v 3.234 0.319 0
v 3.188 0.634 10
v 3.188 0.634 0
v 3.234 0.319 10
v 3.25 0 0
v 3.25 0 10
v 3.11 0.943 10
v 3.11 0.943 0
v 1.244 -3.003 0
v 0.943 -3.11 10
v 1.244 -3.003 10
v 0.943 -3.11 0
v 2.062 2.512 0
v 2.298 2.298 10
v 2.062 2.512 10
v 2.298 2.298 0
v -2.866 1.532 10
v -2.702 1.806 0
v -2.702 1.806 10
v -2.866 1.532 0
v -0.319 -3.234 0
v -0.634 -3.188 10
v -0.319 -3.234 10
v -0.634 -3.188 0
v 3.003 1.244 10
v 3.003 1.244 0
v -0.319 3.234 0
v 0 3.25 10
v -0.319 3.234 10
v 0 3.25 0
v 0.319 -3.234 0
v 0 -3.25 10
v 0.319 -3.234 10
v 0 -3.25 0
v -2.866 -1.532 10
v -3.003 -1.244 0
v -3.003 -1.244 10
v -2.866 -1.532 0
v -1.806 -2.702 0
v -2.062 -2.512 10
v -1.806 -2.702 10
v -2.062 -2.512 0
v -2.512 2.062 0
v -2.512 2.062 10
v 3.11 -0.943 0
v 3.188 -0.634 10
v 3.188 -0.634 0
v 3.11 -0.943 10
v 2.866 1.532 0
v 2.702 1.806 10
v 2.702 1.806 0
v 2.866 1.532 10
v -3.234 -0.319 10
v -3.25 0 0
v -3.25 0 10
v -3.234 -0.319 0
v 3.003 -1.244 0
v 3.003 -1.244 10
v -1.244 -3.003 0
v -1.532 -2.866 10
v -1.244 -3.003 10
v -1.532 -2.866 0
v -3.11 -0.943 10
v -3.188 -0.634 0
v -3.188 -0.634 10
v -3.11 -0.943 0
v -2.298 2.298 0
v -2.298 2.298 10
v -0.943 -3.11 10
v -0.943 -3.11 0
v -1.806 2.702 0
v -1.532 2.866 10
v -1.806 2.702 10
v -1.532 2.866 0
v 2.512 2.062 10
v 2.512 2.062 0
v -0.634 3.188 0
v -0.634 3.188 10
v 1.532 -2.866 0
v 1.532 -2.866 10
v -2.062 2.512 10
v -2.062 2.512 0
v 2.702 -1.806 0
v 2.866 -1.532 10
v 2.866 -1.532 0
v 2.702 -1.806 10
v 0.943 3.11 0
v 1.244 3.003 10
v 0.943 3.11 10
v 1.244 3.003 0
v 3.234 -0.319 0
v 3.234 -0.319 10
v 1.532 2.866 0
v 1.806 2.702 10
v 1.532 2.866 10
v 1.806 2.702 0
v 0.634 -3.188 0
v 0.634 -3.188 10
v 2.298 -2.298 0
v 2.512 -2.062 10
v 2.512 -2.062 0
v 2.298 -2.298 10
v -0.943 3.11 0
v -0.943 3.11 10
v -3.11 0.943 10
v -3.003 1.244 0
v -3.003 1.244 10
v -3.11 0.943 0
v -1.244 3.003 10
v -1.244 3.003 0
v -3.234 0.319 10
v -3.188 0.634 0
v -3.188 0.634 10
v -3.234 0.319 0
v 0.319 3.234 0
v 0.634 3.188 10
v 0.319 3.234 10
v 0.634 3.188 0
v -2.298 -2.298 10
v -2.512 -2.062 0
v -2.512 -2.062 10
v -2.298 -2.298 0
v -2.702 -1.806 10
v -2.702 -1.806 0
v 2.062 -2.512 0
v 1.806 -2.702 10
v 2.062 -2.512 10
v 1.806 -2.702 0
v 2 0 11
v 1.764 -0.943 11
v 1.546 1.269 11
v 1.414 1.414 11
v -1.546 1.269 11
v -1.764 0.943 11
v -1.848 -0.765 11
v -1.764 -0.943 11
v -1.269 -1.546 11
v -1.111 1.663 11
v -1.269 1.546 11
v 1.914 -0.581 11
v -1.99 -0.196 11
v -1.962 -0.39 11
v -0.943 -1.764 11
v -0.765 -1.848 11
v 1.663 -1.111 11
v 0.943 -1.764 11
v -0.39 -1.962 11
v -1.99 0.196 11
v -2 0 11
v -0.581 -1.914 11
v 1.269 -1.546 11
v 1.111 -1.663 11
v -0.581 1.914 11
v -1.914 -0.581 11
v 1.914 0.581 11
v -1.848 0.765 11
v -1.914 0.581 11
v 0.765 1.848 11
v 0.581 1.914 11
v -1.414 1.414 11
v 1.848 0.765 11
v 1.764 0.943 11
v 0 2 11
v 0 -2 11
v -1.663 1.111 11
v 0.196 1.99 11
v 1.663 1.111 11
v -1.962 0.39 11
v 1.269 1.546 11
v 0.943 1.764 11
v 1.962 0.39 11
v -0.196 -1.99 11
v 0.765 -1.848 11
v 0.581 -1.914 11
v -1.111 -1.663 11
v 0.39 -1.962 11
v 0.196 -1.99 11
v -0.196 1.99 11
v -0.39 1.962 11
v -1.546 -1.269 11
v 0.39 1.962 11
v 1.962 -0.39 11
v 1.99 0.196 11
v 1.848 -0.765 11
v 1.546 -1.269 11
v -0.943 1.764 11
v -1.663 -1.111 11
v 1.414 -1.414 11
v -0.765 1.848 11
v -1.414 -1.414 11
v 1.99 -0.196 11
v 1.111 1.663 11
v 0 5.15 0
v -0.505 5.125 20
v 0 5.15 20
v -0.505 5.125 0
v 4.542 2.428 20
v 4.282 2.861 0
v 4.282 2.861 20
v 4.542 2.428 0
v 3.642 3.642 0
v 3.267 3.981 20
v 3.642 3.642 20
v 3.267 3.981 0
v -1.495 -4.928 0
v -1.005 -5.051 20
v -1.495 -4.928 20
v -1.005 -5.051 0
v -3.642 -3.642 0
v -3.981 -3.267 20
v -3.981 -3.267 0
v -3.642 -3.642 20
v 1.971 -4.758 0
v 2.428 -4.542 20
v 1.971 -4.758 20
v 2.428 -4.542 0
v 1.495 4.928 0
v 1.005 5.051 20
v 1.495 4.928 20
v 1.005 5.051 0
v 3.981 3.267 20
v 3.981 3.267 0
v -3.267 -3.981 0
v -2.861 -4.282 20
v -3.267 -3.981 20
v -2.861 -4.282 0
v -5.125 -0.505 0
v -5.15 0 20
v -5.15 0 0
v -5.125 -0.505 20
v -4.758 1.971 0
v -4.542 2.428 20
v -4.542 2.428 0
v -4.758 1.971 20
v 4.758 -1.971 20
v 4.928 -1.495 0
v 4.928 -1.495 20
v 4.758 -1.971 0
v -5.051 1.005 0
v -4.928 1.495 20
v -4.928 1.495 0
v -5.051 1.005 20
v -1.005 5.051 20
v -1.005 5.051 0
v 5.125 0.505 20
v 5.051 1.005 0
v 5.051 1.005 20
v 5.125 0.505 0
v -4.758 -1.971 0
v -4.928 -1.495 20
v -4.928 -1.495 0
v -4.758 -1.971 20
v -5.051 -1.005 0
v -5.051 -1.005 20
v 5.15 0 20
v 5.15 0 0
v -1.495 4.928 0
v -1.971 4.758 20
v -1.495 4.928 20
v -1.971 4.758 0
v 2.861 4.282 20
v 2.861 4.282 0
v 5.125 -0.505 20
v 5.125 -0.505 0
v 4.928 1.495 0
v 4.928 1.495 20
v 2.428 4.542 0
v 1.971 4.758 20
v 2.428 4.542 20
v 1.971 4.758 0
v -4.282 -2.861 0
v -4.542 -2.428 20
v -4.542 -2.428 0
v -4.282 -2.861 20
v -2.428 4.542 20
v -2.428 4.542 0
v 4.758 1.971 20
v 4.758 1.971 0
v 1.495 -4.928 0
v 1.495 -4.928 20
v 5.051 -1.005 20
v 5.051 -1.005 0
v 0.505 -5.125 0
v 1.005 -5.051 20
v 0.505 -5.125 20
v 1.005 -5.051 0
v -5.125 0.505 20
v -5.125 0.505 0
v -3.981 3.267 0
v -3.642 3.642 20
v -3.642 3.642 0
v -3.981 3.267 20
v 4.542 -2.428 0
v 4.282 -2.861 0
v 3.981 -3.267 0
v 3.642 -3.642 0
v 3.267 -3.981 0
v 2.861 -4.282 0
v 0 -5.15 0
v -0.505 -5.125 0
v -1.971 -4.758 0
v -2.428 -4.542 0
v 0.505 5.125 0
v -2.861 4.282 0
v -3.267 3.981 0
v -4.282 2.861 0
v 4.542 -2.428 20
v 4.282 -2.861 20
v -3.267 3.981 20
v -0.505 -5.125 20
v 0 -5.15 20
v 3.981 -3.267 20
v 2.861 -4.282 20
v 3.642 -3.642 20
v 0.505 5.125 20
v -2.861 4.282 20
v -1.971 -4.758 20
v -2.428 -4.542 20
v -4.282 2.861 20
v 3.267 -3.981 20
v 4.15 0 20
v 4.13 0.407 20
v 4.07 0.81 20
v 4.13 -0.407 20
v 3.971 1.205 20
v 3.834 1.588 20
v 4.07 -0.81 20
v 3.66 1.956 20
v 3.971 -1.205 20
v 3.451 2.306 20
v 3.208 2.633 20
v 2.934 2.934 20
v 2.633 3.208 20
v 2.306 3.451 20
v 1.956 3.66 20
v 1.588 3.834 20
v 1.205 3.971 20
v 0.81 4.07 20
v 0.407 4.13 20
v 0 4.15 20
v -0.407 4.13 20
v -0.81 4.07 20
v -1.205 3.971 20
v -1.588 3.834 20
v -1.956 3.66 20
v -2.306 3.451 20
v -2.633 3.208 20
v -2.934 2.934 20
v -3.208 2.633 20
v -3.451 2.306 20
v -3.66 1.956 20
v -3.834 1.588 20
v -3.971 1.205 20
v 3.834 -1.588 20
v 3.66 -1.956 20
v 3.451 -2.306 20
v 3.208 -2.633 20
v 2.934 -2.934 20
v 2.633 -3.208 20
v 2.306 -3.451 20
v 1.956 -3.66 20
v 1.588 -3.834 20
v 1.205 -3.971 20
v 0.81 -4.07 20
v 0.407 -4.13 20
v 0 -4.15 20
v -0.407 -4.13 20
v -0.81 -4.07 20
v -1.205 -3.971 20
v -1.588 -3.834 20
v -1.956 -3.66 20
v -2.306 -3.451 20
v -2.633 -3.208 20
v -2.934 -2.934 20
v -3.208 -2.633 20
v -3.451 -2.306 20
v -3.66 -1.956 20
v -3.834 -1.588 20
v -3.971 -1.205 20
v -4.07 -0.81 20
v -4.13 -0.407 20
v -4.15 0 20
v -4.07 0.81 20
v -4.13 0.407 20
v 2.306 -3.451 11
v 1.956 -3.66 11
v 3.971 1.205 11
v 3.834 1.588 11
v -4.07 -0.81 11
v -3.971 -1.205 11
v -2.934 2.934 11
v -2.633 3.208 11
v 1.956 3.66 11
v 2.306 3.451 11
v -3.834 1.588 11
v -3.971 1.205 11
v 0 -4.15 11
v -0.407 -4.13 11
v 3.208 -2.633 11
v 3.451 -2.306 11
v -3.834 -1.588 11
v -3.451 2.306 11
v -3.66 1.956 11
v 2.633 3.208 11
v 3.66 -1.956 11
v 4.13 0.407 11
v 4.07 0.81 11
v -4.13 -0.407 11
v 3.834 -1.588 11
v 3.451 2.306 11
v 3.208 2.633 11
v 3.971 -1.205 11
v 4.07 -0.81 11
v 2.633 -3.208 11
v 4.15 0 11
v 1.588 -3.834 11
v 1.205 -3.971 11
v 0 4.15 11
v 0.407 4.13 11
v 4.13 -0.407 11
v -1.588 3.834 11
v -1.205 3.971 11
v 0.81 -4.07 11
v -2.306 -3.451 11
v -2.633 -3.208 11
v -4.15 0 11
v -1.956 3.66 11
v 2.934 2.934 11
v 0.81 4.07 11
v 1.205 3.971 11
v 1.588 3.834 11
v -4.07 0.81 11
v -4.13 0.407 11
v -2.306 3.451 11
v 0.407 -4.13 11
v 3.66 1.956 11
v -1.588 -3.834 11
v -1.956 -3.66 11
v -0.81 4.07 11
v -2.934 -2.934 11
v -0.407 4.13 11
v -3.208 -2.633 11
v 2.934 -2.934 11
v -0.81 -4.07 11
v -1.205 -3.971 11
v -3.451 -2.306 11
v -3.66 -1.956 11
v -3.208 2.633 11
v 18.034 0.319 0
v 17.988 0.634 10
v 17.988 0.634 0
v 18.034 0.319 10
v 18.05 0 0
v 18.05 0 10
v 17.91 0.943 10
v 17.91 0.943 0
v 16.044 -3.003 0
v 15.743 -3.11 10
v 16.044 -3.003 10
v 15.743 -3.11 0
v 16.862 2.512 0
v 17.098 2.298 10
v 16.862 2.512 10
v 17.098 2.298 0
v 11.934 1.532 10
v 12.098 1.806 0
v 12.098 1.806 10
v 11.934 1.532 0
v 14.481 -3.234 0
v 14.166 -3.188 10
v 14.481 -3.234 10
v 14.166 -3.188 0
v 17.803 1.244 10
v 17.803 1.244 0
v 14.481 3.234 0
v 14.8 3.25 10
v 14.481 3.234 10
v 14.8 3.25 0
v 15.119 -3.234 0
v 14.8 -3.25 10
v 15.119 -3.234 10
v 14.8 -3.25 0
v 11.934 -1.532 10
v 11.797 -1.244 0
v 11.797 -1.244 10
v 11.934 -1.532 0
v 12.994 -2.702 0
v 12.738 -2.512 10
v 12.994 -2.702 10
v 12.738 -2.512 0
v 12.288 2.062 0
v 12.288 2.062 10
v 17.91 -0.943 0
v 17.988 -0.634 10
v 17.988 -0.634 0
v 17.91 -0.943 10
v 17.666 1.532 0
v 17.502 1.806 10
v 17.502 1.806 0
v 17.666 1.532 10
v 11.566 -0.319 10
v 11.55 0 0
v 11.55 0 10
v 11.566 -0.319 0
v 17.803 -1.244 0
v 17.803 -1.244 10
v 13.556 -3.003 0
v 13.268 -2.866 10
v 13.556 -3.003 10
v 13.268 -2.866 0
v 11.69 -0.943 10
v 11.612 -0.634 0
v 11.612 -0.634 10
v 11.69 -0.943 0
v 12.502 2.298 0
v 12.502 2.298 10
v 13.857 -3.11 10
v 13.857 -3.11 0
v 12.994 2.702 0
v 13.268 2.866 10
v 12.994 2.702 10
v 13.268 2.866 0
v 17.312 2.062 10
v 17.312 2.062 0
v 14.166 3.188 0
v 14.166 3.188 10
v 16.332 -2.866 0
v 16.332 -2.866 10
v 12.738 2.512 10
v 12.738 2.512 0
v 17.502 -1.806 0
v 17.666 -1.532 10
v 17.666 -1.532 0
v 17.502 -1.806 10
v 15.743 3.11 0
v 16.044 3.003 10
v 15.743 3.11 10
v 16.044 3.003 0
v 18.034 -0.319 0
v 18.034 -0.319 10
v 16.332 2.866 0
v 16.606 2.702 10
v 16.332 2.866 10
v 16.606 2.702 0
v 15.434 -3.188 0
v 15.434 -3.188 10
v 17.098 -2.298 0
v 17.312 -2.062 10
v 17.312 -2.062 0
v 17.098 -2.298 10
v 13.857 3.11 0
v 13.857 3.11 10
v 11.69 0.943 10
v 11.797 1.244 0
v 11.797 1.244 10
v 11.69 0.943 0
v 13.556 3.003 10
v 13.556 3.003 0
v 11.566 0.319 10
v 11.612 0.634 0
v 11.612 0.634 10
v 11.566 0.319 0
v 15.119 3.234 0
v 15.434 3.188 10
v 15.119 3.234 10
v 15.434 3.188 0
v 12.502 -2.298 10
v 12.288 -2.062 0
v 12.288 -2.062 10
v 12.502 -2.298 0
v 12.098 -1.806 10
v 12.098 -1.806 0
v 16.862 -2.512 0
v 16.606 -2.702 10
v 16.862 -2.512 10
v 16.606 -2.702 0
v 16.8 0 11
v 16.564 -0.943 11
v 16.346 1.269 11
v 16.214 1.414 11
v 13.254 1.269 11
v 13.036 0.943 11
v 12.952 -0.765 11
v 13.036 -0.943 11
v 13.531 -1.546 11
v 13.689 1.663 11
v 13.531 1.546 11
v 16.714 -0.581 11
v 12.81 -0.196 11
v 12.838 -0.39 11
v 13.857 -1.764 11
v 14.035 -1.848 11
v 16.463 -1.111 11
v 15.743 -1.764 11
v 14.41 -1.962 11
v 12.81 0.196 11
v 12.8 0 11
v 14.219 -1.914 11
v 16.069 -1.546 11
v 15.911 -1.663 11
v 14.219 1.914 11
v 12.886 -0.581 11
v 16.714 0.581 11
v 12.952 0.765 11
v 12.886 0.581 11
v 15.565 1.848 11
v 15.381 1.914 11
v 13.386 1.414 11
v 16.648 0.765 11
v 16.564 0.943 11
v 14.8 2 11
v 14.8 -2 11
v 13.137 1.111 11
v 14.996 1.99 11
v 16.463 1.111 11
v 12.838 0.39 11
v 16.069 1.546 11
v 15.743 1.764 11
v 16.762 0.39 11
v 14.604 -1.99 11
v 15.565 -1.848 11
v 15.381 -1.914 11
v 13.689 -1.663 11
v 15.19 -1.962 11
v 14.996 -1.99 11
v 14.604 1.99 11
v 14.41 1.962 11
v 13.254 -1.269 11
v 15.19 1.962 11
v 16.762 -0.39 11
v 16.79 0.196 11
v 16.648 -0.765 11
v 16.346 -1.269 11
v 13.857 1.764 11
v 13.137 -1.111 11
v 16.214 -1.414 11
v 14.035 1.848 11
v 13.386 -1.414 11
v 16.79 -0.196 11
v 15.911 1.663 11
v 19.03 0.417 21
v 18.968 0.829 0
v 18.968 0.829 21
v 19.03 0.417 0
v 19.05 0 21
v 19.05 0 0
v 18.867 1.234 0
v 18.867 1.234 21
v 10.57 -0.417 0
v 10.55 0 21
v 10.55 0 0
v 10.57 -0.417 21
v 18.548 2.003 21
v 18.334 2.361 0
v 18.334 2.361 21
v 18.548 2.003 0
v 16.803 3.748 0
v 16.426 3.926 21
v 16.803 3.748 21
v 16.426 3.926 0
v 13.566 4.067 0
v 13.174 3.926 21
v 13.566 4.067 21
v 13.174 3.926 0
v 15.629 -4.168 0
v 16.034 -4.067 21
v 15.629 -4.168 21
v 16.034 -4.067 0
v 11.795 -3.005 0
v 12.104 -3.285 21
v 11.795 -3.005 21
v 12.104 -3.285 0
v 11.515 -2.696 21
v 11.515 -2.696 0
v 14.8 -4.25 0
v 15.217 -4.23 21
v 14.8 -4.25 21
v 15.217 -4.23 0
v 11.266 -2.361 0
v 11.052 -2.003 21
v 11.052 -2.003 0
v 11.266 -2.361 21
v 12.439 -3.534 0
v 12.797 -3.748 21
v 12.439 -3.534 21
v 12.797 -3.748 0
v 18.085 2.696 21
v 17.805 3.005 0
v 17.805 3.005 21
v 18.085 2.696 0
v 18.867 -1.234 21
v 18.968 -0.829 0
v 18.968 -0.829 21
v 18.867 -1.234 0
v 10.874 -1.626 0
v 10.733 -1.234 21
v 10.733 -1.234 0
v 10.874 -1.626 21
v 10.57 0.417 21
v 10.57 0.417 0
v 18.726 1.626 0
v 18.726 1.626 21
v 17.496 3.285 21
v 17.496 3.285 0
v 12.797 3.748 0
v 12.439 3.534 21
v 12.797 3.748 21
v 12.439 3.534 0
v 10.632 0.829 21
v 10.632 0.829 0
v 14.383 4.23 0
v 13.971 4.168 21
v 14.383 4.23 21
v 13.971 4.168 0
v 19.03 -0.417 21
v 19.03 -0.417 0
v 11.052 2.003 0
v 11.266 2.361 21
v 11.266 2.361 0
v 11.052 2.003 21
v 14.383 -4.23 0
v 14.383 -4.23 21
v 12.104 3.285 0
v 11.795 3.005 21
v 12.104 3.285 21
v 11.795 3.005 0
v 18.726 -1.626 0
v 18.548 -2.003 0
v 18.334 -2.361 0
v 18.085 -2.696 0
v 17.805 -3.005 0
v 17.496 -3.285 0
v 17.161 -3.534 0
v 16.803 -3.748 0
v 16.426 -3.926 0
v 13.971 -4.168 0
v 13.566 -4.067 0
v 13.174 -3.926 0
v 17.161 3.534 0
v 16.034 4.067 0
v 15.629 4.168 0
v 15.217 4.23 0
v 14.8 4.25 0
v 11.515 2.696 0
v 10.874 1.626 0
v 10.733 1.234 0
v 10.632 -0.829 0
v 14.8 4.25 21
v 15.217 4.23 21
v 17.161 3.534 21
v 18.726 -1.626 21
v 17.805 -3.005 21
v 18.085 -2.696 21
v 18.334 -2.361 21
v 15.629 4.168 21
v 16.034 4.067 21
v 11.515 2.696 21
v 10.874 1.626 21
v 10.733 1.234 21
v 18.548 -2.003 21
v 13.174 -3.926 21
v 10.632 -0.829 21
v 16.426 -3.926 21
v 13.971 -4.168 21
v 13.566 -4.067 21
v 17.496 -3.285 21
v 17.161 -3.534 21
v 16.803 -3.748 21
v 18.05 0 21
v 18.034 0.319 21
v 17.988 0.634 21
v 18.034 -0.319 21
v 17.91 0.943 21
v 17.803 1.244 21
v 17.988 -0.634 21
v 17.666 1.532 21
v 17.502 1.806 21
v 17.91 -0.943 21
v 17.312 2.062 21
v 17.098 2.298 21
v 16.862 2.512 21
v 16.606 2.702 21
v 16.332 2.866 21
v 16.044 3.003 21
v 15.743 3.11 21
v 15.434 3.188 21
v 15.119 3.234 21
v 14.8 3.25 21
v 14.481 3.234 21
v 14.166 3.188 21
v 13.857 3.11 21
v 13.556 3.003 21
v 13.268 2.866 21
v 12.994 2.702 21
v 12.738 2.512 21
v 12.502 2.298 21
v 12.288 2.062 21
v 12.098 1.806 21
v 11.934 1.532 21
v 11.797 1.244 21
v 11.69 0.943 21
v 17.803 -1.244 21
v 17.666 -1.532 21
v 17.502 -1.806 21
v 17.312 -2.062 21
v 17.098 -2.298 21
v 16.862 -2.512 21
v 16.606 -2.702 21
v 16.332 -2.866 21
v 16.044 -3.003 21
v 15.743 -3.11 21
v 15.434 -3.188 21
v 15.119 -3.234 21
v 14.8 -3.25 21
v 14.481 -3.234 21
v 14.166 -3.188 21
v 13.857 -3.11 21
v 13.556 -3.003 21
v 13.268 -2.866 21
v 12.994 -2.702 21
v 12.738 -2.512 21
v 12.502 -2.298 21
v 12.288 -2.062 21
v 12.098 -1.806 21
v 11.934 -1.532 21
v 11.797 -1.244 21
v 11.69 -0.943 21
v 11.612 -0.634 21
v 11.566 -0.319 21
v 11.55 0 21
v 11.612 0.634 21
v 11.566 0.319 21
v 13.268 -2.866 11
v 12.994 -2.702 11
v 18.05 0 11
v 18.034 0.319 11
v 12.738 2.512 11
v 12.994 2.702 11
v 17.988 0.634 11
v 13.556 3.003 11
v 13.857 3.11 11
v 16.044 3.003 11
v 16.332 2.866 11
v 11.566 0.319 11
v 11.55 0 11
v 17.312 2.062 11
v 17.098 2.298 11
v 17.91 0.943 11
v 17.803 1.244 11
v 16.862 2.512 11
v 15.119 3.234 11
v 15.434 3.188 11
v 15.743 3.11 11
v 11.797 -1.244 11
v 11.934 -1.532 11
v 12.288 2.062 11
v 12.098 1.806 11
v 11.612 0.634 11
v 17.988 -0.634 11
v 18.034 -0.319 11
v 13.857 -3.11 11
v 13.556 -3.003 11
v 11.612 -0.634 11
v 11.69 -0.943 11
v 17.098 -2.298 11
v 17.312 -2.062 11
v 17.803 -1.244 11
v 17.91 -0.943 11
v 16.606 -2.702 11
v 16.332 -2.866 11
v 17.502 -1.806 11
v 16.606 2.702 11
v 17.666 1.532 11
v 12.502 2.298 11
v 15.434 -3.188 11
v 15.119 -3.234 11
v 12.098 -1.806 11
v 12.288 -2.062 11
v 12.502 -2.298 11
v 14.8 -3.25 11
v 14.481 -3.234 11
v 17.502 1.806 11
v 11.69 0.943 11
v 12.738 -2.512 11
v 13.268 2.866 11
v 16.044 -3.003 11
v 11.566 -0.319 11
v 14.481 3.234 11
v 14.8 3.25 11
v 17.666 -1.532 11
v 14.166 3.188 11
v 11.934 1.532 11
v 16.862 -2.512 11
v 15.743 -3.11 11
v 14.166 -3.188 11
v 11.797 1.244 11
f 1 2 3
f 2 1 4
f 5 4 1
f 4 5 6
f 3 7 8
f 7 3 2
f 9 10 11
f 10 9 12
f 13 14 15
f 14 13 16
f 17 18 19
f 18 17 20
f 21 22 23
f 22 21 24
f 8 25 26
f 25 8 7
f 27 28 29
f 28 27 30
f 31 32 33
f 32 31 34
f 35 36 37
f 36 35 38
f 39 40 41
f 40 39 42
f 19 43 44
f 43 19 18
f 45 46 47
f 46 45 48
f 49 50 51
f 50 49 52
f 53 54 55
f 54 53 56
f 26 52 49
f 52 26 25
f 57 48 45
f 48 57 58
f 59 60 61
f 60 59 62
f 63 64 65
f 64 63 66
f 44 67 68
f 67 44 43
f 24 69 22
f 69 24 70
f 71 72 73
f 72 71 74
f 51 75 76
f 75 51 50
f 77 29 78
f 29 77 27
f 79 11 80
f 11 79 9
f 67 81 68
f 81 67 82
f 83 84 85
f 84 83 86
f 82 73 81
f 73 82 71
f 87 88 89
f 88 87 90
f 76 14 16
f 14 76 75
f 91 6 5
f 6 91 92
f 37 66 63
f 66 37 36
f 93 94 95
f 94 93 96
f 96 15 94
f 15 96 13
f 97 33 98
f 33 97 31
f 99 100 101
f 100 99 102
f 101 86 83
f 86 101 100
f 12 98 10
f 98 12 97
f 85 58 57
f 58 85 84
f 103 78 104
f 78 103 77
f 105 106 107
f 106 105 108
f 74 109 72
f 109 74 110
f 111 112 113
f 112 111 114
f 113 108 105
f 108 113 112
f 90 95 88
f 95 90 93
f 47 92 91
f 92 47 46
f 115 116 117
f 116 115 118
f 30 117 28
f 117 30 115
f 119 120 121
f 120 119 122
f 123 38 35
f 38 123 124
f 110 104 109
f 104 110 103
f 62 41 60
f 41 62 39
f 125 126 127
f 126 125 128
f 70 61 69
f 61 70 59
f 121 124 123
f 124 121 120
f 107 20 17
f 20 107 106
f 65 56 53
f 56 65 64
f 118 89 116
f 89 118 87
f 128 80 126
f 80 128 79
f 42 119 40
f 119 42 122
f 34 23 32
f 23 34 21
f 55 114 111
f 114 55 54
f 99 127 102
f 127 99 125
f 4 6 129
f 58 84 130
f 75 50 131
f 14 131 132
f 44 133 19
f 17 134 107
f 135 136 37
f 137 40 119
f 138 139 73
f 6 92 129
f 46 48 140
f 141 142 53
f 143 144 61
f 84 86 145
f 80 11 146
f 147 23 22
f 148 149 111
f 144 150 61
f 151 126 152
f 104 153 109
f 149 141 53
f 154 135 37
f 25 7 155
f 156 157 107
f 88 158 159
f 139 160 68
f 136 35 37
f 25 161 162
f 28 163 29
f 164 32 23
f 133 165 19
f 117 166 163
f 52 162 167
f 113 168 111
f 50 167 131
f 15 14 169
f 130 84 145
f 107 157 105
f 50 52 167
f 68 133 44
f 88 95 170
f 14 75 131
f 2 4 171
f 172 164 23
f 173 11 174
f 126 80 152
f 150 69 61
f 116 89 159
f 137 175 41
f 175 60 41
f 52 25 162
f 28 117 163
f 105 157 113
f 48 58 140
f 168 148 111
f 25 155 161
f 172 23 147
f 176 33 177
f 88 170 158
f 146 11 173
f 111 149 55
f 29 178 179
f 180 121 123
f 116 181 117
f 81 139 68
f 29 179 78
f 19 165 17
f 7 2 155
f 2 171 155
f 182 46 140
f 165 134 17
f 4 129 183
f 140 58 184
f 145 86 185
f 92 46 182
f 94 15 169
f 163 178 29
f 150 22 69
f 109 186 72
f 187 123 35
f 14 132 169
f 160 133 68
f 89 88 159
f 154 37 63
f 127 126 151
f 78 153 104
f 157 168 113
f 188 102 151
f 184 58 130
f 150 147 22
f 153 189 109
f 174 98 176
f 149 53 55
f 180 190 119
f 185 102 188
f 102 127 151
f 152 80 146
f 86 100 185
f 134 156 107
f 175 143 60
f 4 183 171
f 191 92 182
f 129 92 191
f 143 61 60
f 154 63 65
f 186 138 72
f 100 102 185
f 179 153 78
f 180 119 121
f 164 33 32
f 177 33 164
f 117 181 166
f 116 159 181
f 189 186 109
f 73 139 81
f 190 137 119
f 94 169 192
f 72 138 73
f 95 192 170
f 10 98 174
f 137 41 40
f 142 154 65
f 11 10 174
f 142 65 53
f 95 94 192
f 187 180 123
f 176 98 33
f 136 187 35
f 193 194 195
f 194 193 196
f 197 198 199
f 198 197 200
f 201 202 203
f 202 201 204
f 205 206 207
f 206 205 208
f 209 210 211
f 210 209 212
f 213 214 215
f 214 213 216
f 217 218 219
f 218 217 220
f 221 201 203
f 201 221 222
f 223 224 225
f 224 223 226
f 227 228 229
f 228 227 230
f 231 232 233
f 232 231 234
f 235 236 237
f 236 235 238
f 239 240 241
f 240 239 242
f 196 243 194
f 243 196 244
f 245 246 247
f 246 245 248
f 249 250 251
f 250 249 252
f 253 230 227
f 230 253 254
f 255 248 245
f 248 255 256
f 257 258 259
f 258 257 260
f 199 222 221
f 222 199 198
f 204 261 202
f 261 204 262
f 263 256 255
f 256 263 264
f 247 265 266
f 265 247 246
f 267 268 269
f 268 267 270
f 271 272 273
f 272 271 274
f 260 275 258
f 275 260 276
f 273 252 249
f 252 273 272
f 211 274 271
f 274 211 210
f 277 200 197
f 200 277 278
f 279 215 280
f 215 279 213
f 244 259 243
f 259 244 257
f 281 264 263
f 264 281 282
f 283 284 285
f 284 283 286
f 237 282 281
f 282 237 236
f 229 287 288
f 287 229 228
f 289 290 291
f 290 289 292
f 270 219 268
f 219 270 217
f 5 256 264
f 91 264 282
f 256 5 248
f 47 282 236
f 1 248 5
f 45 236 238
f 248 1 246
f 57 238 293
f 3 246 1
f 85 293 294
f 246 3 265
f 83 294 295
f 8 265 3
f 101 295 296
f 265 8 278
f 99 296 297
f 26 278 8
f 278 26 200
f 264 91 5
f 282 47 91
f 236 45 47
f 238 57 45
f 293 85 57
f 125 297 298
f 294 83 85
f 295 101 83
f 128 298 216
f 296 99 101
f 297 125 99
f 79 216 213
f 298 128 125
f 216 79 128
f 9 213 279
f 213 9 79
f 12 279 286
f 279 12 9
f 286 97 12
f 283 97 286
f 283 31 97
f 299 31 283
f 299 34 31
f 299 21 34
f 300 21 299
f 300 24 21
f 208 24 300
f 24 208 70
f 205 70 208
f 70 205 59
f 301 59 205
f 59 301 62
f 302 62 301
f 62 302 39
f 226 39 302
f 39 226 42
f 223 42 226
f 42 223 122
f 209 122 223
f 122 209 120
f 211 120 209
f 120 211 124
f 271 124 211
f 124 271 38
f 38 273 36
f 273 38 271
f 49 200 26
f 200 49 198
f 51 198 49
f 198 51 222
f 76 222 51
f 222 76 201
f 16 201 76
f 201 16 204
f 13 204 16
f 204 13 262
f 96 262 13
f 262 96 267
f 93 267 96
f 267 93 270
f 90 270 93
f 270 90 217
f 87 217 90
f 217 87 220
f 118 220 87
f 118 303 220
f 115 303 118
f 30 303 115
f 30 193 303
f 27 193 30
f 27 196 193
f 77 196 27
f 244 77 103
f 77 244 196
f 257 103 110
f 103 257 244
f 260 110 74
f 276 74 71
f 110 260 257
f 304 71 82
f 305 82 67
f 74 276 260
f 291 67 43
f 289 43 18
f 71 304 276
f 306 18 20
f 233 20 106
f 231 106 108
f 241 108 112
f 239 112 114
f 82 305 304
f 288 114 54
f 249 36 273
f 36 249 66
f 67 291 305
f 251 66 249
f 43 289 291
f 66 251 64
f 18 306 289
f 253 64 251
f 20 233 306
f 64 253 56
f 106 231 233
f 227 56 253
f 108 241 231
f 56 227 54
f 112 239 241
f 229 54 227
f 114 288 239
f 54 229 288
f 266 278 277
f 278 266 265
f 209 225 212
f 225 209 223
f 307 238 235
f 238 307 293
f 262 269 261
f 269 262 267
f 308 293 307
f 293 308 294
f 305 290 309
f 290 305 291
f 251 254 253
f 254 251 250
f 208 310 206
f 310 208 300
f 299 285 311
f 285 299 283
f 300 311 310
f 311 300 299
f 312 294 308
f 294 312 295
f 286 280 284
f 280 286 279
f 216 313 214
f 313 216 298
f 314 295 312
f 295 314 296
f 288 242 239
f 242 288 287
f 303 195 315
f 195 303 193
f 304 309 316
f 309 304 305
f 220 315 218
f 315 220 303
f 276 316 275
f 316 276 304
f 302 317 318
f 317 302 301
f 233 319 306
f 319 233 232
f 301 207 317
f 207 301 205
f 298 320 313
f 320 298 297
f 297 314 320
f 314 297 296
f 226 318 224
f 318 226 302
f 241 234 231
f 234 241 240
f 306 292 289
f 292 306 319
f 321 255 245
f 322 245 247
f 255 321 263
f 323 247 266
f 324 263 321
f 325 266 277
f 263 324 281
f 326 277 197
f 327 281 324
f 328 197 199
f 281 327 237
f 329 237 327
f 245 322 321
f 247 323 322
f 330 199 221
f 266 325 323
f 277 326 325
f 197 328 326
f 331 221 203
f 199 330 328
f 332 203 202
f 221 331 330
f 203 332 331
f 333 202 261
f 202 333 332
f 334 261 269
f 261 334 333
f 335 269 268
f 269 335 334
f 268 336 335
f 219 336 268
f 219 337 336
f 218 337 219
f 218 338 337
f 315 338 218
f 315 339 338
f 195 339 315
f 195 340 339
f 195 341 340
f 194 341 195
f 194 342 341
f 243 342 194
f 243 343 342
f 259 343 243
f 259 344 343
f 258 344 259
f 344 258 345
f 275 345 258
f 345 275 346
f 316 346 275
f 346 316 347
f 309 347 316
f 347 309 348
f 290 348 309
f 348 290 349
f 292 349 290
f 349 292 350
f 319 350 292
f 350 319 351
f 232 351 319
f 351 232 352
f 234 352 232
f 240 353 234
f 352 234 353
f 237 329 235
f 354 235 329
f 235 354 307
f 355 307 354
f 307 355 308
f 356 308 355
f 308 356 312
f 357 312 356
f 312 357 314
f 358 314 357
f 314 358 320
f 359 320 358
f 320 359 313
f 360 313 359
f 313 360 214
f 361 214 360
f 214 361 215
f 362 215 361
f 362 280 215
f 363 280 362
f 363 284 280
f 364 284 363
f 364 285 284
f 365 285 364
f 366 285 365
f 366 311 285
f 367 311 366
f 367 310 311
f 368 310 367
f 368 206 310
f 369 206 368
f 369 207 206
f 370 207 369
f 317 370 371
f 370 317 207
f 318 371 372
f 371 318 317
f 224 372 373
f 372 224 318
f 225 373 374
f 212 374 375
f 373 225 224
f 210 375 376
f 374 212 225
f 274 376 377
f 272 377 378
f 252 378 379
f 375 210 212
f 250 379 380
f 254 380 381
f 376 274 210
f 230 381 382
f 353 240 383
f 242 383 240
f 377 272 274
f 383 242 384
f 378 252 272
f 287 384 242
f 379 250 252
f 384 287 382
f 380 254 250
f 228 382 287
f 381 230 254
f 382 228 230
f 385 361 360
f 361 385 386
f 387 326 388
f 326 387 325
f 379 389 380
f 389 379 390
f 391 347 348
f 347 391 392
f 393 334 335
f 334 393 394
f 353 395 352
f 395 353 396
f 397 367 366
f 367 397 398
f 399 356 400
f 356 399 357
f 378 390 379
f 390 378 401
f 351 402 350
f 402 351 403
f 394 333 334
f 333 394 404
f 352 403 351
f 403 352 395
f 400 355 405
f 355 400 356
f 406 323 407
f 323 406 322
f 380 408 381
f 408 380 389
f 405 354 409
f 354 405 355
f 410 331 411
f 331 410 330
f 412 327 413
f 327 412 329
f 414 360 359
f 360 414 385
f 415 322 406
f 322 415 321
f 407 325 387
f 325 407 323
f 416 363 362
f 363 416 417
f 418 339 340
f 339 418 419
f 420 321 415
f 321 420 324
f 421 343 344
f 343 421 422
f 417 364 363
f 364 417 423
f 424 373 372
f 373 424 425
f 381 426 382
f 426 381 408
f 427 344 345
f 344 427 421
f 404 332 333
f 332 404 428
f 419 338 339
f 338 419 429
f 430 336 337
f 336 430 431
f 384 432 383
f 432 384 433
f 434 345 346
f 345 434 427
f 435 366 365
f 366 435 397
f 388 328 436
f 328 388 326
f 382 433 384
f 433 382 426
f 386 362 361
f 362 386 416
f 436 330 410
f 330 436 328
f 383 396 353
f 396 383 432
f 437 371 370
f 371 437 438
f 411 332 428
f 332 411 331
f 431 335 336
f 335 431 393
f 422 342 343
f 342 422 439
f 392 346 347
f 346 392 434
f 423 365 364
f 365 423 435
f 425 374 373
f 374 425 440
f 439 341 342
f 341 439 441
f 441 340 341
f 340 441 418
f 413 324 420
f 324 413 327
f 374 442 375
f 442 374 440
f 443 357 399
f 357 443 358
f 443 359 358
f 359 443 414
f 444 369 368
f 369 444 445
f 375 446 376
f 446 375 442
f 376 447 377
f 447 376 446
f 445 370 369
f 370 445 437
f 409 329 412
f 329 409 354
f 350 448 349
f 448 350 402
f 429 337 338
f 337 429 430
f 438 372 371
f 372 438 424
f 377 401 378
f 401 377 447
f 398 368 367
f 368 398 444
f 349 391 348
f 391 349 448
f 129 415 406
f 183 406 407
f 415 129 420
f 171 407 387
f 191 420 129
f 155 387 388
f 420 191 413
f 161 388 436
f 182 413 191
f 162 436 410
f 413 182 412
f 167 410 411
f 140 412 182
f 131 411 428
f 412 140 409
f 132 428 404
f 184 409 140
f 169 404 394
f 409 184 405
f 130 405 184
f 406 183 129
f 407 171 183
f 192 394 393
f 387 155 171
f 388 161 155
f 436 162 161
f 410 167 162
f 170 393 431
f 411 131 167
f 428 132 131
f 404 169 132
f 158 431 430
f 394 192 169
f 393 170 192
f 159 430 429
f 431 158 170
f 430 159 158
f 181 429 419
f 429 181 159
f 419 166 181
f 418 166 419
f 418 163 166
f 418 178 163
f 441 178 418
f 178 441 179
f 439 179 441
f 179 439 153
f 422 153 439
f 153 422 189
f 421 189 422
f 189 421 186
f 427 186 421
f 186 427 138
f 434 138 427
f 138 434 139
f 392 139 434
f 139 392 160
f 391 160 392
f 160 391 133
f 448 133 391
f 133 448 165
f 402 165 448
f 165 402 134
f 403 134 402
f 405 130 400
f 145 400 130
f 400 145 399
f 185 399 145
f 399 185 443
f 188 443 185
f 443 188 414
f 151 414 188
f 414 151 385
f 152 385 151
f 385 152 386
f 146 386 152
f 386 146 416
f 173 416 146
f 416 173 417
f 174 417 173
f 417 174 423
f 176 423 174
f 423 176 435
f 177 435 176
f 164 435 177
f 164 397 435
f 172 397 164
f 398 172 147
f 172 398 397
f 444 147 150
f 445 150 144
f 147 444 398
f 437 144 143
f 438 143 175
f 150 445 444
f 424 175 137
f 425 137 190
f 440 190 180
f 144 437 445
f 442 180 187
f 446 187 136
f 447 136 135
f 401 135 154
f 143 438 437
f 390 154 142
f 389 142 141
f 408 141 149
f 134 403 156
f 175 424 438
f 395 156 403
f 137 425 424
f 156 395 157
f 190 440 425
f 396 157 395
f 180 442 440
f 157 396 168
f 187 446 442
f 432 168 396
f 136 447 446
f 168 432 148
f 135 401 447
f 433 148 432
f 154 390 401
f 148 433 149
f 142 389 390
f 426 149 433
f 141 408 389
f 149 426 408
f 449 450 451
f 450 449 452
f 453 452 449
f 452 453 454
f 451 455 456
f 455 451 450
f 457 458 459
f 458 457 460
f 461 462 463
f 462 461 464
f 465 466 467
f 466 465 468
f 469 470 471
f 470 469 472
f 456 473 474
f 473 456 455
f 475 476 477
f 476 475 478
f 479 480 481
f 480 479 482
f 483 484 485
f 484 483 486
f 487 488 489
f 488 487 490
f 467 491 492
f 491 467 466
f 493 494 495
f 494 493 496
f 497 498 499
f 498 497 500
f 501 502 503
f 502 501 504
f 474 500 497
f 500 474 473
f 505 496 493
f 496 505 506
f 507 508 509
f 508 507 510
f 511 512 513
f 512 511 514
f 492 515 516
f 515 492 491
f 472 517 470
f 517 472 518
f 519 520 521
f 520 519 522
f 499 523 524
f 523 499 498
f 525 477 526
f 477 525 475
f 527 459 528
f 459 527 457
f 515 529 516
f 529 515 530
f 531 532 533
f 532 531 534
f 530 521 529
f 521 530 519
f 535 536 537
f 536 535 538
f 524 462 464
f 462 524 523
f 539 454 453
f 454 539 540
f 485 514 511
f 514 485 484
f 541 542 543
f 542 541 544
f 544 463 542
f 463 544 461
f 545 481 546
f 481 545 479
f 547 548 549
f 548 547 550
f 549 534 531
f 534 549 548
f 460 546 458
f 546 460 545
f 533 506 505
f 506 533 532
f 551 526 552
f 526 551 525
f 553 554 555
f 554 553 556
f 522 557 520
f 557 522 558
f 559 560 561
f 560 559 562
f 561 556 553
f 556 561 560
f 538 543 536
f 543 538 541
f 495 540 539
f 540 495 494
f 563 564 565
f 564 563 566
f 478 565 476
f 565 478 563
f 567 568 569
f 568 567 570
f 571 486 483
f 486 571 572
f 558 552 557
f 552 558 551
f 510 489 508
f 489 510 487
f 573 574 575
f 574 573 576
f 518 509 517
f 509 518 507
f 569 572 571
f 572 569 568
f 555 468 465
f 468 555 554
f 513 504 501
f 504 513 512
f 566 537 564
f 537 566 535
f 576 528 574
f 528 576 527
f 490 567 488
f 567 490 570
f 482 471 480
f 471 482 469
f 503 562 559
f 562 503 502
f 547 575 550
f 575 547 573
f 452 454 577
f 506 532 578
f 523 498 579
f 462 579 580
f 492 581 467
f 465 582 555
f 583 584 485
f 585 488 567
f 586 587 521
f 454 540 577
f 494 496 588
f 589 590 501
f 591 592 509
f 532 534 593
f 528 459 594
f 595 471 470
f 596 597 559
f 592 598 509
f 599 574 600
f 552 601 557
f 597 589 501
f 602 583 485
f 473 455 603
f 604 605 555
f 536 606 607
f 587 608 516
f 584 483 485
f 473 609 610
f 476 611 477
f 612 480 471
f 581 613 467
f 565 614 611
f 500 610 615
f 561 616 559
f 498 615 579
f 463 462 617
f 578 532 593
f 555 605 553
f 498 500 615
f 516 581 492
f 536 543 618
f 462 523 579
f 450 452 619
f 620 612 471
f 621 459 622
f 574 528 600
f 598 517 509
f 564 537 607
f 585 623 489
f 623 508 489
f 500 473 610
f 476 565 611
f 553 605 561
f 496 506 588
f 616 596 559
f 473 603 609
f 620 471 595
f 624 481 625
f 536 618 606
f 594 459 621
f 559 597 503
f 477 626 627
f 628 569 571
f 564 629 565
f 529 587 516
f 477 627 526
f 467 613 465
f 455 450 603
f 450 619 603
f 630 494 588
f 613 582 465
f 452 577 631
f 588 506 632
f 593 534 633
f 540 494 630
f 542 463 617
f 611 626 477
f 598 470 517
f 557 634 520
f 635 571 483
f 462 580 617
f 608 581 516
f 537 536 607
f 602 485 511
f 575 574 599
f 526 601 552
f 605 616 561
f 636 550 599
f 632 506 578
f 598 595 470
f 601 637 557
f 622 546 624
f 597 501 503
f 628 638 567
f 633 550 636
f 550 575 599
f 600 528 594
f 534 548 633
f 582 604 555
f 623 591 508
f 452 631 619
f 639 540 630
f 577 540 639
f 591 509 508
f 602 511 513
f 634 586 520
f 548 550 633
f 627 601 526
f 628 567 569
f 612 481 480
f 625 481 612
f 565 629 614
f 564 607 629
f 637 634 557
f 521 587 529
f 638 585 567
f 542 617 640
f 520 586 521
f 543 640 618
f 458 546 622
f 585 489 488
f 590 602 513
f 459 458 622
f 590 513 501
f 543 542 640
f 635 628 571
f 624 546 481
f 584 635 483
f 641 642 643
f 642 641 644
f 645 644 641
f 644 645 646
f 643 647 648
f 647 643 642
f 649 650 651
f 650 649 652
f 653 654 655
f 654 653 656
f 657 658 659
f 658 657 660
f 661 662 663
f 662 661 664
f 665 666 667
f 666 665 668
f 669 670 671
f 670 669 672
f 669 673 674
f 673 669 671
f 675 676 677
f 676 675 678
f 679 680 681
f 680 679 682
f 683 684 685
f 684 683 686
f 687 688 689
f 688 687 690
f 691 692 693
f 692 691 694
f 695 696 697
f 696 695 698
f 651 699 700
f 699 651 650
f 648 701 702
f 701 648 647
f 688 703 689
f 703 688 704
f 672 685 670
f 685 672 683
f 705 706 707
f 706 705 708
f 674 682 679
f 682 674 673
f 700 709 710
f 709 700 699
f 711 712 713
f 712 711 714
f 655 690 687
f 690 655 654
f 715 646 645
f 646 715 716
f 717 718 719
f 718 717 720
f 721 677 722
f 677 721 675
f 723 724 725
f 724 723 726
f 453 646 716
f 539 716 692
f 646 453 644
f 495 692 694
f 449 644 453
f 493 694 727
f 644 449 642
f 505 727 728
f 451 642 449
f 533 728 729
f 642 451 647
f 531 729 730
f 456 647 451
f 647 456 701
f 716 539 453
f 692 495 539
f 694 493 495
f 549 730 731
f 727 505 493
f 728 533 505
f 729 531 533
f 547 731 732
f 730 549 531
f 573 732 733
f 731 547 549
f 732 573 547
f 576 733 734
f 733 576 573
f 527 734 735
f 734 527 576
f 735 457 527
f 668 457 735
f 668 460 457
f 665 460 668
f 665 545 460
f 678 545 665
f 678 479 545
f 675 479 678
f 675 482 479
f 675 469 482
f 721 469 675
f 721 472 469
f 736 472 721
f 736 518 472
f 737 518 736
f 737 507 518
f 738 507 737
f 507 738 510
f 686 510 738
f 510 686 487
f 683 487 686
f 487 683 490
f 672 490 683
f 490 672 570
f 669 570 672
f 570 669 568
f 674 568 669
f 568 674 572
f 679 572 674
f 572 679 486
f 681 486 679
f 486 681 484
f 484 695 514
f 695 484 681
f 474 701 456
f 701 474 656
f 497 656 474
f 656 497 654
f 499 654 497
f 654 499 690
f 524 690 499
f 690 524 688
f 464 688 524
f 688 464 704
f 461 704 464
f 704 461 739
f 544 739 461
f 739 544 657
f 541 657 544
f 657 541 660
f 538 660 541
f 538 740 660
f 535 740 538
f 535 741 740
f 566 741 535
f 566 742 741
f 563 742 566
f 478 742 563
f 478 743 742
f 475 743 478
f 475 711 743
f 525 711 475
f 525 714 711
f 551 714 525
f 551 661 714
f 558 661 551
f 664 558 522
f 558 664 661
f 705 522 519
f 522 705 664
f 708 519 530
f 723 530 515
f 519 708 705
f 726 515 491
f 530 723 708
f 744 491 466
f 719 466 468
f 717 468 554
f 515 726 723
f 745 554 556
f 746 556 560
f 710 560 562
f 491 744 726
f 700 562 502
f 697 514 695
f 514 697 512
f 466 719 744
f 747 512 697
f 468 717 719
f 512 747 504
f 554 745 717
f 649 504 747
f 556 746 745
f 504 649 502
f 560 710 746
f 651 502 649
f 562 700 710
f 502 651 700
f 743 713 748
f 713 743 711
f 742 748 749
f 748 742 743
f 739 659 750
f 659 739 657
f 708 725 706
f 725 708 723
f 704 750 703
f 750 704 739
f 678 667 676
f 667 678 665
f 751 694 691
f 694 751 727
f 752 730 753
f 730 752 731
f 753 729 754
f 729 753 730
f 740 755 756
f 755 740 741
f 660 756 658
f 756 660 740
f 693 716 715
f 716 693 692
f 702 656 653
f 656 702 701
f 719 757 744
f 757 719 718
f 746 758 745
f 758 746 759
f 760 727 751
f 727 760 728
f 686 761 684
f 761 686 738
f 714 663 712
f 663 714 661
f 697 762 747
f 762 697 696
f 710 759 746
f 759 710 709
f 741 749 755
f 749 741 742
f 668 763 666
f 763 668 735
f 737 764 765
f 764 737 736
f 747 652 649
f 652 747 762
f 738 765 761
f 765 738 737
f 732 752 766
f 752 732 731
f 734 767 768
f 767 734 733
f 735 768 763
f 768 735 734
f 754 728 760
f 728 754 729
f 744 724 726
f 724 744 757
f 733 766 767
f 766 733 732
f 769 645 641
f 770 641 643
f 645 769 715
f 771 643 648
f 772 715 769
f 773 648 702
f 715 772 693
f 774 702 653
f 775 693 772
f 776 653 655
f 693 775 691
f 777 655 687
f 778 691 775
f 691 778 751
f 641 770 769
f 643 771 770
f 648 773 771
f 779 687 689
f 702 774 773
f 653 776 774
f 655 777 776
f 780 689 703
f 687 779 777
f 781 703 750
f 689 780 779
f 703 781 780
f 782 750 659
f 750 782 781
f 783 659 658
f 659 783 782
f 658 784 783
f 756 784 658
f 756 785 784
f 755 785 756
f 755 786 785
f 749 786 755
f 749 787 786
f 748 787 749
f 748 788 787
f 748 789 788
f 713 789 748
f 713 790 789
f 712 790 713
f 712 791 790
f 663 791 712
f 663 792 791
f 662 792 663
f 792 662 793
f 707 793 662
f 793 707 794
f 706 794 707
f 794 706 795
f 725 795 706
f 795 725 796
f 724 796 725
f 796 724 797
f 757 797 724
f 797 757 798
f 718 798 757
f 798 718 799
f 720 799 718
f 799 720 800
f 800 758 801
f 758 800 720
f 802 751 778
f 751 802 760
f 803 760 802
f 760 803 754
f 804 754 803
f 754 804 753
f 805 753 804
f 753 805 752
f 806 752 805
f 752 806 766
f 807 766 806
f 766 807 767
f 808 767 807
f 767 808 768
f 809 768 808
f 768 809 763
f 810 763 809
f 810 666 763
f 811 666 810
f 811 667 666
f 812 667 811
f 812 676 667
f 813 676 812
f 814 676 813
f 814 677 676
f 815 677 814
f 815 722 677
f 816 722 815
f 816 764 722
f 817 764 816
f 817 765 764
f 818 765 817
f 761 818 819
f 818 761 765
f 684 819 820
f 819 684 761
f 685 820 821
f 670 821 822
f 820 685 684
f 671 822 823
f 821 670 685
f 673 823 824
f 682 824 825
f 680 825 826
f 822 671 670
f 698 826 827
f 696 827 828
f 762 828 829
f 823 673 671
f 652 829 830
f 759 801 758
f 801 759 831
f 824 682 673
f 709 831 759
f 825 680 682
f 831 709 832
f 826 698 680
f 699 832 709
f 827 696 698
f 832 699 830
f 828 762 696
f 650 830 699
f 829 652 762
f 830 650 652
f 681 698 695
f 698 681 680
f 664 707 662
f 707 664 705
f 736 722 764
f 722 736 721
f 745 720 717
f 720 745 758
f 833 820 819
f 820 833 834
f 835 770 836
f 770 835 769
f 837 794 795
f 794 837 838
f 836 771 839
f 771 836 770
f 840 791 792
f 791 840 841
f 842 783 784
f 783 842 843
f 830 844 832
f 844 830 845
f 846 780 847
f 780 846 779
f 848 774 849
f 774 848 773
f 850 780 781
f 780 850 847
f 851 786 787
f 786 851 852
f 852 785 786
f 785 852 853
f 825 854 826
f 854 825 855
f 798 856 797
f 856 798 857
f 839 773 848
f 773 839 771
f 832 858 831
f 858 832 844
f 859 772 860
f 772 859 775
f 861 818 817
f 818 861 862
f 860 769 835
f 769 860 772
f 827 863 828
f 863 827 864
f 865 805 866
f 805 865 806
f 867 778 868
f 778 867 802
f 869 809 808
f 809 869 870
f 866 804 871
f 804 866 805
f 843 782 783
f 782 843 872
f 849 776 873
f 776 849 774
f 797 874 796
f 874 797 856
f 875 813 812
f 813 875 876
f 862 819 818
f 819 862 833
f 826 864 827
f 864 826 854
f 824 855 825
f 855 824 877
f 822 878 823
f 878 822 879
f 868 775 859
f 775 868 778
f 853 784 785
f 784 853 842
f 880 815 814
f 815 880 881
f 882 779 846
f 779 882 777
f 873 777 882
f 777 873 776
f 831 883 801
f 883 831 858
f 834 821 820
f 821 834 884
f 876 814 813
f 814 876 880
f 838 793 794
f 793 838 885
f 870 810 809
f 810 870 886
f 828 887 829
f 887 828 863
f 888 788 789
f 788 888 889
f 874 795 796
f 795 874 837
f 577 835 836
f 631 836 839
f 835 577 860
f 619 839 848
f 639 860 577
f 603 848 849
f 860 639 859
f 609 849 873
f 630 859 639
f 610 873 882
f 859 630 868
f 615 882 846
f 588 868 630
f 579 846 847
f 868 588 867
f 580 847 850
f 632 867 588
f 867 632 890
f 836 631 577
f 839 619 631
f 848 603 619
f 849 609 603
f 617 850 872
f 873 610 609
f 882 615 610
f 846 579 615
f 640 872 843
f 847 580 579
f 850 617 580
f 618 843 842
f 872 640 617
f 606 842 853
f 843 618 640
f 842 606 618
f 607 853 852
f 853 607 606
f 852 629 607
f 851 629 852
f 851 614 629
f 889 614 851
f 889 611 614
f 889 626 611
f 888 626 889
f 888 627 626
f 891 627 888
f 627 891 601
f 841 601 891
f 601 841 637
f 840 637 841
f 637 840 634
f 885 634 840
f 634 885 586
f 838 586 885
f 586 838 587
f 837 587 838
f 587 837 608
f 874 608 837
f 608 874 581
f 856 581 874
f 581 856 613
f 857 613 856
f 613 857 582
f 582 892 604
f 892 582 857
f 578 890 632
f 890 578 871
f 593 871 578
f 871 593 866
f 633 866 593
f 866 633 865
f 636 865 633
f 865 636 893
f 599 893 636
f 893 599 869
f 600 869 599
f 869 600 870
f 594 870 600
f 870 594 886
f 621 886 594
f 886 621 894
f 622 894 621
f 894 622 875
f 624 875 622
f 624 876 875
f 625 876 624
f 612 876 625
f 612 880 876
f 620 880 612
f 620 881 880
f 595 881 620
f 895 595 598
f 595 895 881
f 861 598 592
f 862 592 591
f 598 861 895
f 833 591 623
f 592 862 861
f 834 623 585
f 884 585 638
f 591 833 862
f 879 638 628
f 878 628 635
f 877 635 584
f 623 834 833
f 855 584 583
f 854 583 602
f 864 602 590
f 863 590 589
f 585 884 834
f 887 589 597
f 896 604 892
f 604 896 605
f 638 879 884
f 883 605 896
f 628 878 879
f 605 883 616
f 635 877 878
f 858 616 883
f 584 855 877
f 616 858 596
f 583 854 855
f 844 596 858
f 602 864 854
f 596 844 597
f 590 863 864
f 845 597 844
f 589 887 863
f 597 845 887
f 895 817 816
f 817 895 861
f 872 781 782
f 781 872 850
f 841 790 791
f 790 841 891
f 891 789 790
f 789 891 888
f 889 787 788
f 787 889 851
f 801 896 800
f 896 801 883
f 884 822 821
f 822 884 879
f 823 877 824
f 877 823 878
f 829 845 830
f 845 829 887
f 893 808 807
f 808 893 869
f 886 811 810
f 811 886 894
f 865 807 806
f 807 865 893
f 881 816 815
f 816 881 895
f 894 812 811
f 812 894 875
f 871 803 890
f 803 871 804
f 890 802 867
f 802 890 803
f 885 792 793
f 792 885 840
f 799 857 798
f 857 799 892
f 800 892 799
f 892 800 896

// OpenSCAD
hose=6.5;
printer=8.3;
thickness=1;
hose_length=10;
printer_length=10;
string=4;

$fn=64;

module drill(height) {
    translate([0,0,-1]) cylinder(d=hose,h=height+1);
    translate([0,0,height]) cylinder(d1=hose,d2=string,h=thickness);
    cylinder(d=string,h=height+thickness+1);
}

difference() {
    cylinder(d=printer+2*thickness,h=printer_length+hose_length);
    translate([0,0,hose_length+thickness]) cylinder(d=printer,h=printer_length+1);
    drill(hose_length);
}

translate ([printer+hose,0,0]) difference() {
    cylinder(d=hose+2*thickness,h=2*hose_length+thickness);
    translate([0,0,hose_length+thickness]) cylinder(d=hose,h=hose_length+1);
    drill(hose_length);
}
